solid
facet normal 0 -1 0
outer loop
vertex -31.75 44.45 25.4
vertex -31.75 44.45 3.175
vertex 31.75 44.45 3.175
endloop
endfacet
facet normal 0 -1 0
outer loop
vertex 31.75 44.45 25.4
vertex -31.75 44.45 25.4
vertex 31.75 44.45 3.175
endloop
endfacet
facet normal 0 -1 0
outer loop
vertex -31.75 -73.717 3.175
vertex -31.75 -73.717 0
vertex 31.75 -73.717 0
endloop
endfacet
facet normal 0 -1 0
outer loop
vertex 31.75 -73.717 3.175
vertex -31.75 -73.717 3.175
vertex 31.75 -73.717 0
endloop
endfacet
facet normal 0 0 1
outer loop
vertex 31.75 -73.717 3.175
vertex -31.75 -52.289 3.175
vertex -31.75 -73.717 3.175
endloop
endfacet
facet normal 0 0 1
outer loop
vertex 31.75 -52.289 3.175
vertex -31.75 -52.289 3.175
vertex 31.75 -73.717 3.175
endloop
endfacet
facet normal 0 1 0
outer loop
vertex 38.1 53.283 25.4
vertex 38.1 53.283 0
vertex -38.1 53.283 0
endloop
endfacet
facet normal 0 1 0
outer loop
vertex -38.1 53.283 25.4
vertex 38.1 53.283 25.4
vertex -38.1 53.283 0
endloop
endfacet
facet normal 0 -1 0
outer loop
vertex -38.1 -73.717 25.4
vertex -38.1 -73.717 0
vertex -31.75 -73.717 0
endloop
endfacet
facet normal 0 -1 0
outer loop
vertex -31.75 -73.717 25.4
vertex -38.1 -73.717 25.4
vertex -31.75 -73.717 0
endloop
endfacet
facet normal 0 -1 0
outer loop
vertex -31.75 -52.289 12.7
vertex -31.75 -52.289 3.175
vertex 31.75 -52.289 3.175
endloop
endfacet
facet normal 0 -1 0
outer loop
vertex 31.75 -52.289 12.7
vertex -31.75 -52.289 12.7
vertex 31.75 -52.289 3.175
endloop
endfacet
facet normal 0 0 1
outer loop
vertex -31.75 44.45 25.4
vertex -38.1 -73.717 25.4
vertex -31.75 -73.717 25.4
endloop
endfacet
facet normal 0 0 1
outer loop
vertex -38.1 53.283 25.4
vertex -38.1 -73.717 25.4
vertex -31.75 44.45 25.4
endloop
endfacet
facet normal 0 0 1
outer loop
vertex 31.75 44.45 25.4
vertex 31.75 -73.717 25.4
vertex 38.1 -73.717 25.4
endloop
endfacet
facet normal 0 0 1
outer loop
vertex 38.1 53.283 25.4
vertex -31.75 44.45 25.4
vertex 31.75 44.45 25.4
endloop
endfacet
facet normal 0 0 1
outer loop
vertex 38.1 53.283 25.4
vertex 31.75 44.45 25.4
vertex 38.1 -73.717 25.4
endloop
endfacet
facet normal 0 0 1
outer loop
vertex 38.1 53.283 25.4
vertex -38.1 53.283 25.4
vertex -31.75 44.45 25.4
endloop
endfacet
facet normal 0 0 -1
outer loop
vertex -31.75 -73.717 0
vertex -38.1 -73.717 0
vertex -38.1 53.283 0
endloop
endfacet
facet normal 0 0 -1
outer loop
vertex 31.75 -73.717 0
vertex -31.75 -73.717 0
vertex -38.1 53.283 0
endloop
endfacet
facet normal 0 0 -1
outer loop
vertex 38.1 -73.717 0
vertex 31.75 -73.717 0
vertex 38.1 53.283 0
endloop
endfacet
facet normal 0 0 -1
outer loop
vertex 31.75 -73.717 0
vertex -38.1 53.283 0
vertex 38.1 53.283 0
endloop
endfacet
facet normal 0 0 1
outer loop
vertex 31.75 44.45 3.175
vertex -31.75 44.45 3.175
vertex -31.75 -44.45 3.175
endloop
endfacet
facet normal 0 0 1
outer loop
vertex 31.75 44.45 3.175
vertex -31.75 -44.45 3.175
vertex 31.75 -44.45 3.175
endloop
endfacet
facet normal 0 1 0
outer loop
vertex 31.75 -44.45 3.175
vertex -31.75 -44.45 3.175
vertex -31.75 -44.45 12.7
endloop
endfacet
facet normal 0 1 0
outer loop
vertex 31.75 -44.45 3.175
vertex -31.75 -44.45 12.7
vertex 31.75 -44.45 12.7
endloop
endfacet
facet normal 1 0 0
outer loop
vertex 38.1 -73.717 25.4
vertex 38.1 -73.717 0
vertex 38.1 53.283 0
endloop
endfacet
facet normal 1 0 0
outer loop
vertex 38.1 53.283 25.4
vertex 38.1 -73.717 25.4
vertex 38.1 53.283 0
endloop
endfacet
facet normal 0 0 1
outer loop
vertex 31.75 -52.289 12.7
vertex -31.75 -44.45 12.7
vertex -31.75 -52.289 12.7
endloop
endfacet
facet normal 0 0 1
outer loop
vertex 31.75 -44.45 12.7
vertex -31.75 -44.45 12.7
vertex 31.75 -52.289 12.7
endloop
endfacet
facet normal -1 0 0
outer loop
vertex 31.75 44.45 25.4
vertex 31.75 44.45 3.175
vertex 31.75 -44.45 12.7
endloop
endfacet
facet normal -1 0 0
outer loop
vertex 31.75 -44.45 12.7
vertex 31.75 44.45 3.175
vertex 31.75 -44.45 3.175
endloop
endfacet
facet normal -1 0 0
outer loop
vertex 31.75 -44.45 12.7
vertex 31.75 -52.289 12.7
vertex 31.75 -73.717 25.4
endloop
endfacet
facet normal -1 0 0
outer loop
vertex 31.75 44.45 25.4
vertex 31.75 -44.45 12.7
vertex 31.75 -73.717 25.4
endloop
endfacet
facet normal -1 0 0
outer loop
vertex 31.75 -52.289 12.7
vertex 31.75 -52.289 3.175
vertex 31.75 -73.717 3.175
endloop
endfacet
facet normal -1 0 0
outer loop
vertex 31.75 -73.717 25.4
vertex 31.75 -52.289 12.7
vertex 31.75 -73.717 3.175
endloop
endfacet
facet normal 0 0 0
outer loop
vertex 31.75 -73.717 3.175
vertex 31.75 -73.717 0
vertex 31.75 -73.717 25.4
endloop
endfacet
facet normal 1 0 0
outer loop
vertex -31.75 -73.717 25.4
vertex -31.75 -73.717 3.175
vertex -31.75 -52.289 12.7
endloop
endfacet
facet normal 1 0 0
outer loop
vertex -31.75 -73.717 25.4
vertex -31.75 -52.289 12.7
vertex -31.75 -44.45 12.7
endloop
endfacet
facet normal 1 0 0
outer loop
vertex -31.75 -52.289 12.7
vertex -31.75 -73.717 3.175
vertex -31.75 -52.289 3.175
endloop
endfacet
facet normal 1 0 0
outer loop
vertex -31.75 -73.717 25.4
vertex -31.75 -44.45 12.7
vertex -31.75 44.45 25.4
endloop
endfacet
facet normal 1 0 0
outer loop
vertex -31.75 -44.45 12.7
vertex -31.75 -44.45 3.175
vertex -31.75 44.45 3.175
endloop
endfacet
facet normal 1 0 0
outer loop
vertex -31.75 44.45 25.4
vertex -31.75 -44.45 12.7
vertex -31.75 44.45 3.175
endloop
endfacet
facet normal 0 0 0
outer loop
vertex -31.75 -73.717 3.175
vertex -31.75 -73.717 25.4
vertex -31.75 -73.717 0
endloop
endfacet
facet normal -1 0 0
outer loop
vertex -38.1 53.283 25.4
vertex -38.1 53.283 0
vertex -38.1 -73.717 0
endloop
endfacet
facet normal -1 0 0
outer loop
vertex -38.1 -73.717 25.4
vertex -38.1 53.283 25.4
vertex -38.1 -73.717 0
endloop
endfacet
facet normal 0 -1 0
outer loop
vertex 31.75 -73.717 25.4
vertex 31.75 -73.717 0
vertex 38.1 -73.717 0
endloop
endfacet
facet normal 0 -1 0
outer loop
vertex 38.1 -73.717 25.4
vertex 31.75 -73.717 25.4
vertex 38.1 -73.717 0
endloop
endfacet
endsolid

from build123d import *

# Parameters (mm, degrees)
F0_W     = 63.5
F0_H     = 21.427987
F1_DEPTH = 3.175
F2_DEPTH = 25.4
F0_H_2   = 7.839117
F3_DEPTH = 12.7
F0_H_3   = 88.9
F4_DEPTH = 3.175


with BuildPart() as f1:
    # F0 (on Top) → F1 (new body)
    with BuildSketch(Plane.XY):
        with Locations((0, -63.00311)):
            Rectangle(F0_W, F0_H)
    extrude(amount=F1_DEPTH)

    # F0 (on Top) → F2 (join)
    with BuildSketch(Plane.XY):
        Polygon((-31.75, 44.45), (31.75, 44.45), (31.75, -44.45), (31.75, -52.289117), (31.75, -73.717104), (38.1, -73.717104), (38.1, 53.282896), (-38.1, 53.282896), (-38.1, -73.717104), (-31.75, -73.717104), (-31.75, -52.289117), (-31.75, -44.45), align=None)
    extrude(amount=F2_DEPTH)

    # F0 (on Top) → F3 (join)
    with BuildSketch(Plane.XY):
        with Locations((0, -48.369558)):
            Rectangle(F0_W, F0_H_2)
    extrude(amount=F3_DEPTH)

    # F0 (on Top) → F4 (join)
    with BuildSketch(Plane.XY):
        Rectangle(F0_W, F0_H_3)
    extrude(amount=F4_DEPTH)


solid = f1.part
